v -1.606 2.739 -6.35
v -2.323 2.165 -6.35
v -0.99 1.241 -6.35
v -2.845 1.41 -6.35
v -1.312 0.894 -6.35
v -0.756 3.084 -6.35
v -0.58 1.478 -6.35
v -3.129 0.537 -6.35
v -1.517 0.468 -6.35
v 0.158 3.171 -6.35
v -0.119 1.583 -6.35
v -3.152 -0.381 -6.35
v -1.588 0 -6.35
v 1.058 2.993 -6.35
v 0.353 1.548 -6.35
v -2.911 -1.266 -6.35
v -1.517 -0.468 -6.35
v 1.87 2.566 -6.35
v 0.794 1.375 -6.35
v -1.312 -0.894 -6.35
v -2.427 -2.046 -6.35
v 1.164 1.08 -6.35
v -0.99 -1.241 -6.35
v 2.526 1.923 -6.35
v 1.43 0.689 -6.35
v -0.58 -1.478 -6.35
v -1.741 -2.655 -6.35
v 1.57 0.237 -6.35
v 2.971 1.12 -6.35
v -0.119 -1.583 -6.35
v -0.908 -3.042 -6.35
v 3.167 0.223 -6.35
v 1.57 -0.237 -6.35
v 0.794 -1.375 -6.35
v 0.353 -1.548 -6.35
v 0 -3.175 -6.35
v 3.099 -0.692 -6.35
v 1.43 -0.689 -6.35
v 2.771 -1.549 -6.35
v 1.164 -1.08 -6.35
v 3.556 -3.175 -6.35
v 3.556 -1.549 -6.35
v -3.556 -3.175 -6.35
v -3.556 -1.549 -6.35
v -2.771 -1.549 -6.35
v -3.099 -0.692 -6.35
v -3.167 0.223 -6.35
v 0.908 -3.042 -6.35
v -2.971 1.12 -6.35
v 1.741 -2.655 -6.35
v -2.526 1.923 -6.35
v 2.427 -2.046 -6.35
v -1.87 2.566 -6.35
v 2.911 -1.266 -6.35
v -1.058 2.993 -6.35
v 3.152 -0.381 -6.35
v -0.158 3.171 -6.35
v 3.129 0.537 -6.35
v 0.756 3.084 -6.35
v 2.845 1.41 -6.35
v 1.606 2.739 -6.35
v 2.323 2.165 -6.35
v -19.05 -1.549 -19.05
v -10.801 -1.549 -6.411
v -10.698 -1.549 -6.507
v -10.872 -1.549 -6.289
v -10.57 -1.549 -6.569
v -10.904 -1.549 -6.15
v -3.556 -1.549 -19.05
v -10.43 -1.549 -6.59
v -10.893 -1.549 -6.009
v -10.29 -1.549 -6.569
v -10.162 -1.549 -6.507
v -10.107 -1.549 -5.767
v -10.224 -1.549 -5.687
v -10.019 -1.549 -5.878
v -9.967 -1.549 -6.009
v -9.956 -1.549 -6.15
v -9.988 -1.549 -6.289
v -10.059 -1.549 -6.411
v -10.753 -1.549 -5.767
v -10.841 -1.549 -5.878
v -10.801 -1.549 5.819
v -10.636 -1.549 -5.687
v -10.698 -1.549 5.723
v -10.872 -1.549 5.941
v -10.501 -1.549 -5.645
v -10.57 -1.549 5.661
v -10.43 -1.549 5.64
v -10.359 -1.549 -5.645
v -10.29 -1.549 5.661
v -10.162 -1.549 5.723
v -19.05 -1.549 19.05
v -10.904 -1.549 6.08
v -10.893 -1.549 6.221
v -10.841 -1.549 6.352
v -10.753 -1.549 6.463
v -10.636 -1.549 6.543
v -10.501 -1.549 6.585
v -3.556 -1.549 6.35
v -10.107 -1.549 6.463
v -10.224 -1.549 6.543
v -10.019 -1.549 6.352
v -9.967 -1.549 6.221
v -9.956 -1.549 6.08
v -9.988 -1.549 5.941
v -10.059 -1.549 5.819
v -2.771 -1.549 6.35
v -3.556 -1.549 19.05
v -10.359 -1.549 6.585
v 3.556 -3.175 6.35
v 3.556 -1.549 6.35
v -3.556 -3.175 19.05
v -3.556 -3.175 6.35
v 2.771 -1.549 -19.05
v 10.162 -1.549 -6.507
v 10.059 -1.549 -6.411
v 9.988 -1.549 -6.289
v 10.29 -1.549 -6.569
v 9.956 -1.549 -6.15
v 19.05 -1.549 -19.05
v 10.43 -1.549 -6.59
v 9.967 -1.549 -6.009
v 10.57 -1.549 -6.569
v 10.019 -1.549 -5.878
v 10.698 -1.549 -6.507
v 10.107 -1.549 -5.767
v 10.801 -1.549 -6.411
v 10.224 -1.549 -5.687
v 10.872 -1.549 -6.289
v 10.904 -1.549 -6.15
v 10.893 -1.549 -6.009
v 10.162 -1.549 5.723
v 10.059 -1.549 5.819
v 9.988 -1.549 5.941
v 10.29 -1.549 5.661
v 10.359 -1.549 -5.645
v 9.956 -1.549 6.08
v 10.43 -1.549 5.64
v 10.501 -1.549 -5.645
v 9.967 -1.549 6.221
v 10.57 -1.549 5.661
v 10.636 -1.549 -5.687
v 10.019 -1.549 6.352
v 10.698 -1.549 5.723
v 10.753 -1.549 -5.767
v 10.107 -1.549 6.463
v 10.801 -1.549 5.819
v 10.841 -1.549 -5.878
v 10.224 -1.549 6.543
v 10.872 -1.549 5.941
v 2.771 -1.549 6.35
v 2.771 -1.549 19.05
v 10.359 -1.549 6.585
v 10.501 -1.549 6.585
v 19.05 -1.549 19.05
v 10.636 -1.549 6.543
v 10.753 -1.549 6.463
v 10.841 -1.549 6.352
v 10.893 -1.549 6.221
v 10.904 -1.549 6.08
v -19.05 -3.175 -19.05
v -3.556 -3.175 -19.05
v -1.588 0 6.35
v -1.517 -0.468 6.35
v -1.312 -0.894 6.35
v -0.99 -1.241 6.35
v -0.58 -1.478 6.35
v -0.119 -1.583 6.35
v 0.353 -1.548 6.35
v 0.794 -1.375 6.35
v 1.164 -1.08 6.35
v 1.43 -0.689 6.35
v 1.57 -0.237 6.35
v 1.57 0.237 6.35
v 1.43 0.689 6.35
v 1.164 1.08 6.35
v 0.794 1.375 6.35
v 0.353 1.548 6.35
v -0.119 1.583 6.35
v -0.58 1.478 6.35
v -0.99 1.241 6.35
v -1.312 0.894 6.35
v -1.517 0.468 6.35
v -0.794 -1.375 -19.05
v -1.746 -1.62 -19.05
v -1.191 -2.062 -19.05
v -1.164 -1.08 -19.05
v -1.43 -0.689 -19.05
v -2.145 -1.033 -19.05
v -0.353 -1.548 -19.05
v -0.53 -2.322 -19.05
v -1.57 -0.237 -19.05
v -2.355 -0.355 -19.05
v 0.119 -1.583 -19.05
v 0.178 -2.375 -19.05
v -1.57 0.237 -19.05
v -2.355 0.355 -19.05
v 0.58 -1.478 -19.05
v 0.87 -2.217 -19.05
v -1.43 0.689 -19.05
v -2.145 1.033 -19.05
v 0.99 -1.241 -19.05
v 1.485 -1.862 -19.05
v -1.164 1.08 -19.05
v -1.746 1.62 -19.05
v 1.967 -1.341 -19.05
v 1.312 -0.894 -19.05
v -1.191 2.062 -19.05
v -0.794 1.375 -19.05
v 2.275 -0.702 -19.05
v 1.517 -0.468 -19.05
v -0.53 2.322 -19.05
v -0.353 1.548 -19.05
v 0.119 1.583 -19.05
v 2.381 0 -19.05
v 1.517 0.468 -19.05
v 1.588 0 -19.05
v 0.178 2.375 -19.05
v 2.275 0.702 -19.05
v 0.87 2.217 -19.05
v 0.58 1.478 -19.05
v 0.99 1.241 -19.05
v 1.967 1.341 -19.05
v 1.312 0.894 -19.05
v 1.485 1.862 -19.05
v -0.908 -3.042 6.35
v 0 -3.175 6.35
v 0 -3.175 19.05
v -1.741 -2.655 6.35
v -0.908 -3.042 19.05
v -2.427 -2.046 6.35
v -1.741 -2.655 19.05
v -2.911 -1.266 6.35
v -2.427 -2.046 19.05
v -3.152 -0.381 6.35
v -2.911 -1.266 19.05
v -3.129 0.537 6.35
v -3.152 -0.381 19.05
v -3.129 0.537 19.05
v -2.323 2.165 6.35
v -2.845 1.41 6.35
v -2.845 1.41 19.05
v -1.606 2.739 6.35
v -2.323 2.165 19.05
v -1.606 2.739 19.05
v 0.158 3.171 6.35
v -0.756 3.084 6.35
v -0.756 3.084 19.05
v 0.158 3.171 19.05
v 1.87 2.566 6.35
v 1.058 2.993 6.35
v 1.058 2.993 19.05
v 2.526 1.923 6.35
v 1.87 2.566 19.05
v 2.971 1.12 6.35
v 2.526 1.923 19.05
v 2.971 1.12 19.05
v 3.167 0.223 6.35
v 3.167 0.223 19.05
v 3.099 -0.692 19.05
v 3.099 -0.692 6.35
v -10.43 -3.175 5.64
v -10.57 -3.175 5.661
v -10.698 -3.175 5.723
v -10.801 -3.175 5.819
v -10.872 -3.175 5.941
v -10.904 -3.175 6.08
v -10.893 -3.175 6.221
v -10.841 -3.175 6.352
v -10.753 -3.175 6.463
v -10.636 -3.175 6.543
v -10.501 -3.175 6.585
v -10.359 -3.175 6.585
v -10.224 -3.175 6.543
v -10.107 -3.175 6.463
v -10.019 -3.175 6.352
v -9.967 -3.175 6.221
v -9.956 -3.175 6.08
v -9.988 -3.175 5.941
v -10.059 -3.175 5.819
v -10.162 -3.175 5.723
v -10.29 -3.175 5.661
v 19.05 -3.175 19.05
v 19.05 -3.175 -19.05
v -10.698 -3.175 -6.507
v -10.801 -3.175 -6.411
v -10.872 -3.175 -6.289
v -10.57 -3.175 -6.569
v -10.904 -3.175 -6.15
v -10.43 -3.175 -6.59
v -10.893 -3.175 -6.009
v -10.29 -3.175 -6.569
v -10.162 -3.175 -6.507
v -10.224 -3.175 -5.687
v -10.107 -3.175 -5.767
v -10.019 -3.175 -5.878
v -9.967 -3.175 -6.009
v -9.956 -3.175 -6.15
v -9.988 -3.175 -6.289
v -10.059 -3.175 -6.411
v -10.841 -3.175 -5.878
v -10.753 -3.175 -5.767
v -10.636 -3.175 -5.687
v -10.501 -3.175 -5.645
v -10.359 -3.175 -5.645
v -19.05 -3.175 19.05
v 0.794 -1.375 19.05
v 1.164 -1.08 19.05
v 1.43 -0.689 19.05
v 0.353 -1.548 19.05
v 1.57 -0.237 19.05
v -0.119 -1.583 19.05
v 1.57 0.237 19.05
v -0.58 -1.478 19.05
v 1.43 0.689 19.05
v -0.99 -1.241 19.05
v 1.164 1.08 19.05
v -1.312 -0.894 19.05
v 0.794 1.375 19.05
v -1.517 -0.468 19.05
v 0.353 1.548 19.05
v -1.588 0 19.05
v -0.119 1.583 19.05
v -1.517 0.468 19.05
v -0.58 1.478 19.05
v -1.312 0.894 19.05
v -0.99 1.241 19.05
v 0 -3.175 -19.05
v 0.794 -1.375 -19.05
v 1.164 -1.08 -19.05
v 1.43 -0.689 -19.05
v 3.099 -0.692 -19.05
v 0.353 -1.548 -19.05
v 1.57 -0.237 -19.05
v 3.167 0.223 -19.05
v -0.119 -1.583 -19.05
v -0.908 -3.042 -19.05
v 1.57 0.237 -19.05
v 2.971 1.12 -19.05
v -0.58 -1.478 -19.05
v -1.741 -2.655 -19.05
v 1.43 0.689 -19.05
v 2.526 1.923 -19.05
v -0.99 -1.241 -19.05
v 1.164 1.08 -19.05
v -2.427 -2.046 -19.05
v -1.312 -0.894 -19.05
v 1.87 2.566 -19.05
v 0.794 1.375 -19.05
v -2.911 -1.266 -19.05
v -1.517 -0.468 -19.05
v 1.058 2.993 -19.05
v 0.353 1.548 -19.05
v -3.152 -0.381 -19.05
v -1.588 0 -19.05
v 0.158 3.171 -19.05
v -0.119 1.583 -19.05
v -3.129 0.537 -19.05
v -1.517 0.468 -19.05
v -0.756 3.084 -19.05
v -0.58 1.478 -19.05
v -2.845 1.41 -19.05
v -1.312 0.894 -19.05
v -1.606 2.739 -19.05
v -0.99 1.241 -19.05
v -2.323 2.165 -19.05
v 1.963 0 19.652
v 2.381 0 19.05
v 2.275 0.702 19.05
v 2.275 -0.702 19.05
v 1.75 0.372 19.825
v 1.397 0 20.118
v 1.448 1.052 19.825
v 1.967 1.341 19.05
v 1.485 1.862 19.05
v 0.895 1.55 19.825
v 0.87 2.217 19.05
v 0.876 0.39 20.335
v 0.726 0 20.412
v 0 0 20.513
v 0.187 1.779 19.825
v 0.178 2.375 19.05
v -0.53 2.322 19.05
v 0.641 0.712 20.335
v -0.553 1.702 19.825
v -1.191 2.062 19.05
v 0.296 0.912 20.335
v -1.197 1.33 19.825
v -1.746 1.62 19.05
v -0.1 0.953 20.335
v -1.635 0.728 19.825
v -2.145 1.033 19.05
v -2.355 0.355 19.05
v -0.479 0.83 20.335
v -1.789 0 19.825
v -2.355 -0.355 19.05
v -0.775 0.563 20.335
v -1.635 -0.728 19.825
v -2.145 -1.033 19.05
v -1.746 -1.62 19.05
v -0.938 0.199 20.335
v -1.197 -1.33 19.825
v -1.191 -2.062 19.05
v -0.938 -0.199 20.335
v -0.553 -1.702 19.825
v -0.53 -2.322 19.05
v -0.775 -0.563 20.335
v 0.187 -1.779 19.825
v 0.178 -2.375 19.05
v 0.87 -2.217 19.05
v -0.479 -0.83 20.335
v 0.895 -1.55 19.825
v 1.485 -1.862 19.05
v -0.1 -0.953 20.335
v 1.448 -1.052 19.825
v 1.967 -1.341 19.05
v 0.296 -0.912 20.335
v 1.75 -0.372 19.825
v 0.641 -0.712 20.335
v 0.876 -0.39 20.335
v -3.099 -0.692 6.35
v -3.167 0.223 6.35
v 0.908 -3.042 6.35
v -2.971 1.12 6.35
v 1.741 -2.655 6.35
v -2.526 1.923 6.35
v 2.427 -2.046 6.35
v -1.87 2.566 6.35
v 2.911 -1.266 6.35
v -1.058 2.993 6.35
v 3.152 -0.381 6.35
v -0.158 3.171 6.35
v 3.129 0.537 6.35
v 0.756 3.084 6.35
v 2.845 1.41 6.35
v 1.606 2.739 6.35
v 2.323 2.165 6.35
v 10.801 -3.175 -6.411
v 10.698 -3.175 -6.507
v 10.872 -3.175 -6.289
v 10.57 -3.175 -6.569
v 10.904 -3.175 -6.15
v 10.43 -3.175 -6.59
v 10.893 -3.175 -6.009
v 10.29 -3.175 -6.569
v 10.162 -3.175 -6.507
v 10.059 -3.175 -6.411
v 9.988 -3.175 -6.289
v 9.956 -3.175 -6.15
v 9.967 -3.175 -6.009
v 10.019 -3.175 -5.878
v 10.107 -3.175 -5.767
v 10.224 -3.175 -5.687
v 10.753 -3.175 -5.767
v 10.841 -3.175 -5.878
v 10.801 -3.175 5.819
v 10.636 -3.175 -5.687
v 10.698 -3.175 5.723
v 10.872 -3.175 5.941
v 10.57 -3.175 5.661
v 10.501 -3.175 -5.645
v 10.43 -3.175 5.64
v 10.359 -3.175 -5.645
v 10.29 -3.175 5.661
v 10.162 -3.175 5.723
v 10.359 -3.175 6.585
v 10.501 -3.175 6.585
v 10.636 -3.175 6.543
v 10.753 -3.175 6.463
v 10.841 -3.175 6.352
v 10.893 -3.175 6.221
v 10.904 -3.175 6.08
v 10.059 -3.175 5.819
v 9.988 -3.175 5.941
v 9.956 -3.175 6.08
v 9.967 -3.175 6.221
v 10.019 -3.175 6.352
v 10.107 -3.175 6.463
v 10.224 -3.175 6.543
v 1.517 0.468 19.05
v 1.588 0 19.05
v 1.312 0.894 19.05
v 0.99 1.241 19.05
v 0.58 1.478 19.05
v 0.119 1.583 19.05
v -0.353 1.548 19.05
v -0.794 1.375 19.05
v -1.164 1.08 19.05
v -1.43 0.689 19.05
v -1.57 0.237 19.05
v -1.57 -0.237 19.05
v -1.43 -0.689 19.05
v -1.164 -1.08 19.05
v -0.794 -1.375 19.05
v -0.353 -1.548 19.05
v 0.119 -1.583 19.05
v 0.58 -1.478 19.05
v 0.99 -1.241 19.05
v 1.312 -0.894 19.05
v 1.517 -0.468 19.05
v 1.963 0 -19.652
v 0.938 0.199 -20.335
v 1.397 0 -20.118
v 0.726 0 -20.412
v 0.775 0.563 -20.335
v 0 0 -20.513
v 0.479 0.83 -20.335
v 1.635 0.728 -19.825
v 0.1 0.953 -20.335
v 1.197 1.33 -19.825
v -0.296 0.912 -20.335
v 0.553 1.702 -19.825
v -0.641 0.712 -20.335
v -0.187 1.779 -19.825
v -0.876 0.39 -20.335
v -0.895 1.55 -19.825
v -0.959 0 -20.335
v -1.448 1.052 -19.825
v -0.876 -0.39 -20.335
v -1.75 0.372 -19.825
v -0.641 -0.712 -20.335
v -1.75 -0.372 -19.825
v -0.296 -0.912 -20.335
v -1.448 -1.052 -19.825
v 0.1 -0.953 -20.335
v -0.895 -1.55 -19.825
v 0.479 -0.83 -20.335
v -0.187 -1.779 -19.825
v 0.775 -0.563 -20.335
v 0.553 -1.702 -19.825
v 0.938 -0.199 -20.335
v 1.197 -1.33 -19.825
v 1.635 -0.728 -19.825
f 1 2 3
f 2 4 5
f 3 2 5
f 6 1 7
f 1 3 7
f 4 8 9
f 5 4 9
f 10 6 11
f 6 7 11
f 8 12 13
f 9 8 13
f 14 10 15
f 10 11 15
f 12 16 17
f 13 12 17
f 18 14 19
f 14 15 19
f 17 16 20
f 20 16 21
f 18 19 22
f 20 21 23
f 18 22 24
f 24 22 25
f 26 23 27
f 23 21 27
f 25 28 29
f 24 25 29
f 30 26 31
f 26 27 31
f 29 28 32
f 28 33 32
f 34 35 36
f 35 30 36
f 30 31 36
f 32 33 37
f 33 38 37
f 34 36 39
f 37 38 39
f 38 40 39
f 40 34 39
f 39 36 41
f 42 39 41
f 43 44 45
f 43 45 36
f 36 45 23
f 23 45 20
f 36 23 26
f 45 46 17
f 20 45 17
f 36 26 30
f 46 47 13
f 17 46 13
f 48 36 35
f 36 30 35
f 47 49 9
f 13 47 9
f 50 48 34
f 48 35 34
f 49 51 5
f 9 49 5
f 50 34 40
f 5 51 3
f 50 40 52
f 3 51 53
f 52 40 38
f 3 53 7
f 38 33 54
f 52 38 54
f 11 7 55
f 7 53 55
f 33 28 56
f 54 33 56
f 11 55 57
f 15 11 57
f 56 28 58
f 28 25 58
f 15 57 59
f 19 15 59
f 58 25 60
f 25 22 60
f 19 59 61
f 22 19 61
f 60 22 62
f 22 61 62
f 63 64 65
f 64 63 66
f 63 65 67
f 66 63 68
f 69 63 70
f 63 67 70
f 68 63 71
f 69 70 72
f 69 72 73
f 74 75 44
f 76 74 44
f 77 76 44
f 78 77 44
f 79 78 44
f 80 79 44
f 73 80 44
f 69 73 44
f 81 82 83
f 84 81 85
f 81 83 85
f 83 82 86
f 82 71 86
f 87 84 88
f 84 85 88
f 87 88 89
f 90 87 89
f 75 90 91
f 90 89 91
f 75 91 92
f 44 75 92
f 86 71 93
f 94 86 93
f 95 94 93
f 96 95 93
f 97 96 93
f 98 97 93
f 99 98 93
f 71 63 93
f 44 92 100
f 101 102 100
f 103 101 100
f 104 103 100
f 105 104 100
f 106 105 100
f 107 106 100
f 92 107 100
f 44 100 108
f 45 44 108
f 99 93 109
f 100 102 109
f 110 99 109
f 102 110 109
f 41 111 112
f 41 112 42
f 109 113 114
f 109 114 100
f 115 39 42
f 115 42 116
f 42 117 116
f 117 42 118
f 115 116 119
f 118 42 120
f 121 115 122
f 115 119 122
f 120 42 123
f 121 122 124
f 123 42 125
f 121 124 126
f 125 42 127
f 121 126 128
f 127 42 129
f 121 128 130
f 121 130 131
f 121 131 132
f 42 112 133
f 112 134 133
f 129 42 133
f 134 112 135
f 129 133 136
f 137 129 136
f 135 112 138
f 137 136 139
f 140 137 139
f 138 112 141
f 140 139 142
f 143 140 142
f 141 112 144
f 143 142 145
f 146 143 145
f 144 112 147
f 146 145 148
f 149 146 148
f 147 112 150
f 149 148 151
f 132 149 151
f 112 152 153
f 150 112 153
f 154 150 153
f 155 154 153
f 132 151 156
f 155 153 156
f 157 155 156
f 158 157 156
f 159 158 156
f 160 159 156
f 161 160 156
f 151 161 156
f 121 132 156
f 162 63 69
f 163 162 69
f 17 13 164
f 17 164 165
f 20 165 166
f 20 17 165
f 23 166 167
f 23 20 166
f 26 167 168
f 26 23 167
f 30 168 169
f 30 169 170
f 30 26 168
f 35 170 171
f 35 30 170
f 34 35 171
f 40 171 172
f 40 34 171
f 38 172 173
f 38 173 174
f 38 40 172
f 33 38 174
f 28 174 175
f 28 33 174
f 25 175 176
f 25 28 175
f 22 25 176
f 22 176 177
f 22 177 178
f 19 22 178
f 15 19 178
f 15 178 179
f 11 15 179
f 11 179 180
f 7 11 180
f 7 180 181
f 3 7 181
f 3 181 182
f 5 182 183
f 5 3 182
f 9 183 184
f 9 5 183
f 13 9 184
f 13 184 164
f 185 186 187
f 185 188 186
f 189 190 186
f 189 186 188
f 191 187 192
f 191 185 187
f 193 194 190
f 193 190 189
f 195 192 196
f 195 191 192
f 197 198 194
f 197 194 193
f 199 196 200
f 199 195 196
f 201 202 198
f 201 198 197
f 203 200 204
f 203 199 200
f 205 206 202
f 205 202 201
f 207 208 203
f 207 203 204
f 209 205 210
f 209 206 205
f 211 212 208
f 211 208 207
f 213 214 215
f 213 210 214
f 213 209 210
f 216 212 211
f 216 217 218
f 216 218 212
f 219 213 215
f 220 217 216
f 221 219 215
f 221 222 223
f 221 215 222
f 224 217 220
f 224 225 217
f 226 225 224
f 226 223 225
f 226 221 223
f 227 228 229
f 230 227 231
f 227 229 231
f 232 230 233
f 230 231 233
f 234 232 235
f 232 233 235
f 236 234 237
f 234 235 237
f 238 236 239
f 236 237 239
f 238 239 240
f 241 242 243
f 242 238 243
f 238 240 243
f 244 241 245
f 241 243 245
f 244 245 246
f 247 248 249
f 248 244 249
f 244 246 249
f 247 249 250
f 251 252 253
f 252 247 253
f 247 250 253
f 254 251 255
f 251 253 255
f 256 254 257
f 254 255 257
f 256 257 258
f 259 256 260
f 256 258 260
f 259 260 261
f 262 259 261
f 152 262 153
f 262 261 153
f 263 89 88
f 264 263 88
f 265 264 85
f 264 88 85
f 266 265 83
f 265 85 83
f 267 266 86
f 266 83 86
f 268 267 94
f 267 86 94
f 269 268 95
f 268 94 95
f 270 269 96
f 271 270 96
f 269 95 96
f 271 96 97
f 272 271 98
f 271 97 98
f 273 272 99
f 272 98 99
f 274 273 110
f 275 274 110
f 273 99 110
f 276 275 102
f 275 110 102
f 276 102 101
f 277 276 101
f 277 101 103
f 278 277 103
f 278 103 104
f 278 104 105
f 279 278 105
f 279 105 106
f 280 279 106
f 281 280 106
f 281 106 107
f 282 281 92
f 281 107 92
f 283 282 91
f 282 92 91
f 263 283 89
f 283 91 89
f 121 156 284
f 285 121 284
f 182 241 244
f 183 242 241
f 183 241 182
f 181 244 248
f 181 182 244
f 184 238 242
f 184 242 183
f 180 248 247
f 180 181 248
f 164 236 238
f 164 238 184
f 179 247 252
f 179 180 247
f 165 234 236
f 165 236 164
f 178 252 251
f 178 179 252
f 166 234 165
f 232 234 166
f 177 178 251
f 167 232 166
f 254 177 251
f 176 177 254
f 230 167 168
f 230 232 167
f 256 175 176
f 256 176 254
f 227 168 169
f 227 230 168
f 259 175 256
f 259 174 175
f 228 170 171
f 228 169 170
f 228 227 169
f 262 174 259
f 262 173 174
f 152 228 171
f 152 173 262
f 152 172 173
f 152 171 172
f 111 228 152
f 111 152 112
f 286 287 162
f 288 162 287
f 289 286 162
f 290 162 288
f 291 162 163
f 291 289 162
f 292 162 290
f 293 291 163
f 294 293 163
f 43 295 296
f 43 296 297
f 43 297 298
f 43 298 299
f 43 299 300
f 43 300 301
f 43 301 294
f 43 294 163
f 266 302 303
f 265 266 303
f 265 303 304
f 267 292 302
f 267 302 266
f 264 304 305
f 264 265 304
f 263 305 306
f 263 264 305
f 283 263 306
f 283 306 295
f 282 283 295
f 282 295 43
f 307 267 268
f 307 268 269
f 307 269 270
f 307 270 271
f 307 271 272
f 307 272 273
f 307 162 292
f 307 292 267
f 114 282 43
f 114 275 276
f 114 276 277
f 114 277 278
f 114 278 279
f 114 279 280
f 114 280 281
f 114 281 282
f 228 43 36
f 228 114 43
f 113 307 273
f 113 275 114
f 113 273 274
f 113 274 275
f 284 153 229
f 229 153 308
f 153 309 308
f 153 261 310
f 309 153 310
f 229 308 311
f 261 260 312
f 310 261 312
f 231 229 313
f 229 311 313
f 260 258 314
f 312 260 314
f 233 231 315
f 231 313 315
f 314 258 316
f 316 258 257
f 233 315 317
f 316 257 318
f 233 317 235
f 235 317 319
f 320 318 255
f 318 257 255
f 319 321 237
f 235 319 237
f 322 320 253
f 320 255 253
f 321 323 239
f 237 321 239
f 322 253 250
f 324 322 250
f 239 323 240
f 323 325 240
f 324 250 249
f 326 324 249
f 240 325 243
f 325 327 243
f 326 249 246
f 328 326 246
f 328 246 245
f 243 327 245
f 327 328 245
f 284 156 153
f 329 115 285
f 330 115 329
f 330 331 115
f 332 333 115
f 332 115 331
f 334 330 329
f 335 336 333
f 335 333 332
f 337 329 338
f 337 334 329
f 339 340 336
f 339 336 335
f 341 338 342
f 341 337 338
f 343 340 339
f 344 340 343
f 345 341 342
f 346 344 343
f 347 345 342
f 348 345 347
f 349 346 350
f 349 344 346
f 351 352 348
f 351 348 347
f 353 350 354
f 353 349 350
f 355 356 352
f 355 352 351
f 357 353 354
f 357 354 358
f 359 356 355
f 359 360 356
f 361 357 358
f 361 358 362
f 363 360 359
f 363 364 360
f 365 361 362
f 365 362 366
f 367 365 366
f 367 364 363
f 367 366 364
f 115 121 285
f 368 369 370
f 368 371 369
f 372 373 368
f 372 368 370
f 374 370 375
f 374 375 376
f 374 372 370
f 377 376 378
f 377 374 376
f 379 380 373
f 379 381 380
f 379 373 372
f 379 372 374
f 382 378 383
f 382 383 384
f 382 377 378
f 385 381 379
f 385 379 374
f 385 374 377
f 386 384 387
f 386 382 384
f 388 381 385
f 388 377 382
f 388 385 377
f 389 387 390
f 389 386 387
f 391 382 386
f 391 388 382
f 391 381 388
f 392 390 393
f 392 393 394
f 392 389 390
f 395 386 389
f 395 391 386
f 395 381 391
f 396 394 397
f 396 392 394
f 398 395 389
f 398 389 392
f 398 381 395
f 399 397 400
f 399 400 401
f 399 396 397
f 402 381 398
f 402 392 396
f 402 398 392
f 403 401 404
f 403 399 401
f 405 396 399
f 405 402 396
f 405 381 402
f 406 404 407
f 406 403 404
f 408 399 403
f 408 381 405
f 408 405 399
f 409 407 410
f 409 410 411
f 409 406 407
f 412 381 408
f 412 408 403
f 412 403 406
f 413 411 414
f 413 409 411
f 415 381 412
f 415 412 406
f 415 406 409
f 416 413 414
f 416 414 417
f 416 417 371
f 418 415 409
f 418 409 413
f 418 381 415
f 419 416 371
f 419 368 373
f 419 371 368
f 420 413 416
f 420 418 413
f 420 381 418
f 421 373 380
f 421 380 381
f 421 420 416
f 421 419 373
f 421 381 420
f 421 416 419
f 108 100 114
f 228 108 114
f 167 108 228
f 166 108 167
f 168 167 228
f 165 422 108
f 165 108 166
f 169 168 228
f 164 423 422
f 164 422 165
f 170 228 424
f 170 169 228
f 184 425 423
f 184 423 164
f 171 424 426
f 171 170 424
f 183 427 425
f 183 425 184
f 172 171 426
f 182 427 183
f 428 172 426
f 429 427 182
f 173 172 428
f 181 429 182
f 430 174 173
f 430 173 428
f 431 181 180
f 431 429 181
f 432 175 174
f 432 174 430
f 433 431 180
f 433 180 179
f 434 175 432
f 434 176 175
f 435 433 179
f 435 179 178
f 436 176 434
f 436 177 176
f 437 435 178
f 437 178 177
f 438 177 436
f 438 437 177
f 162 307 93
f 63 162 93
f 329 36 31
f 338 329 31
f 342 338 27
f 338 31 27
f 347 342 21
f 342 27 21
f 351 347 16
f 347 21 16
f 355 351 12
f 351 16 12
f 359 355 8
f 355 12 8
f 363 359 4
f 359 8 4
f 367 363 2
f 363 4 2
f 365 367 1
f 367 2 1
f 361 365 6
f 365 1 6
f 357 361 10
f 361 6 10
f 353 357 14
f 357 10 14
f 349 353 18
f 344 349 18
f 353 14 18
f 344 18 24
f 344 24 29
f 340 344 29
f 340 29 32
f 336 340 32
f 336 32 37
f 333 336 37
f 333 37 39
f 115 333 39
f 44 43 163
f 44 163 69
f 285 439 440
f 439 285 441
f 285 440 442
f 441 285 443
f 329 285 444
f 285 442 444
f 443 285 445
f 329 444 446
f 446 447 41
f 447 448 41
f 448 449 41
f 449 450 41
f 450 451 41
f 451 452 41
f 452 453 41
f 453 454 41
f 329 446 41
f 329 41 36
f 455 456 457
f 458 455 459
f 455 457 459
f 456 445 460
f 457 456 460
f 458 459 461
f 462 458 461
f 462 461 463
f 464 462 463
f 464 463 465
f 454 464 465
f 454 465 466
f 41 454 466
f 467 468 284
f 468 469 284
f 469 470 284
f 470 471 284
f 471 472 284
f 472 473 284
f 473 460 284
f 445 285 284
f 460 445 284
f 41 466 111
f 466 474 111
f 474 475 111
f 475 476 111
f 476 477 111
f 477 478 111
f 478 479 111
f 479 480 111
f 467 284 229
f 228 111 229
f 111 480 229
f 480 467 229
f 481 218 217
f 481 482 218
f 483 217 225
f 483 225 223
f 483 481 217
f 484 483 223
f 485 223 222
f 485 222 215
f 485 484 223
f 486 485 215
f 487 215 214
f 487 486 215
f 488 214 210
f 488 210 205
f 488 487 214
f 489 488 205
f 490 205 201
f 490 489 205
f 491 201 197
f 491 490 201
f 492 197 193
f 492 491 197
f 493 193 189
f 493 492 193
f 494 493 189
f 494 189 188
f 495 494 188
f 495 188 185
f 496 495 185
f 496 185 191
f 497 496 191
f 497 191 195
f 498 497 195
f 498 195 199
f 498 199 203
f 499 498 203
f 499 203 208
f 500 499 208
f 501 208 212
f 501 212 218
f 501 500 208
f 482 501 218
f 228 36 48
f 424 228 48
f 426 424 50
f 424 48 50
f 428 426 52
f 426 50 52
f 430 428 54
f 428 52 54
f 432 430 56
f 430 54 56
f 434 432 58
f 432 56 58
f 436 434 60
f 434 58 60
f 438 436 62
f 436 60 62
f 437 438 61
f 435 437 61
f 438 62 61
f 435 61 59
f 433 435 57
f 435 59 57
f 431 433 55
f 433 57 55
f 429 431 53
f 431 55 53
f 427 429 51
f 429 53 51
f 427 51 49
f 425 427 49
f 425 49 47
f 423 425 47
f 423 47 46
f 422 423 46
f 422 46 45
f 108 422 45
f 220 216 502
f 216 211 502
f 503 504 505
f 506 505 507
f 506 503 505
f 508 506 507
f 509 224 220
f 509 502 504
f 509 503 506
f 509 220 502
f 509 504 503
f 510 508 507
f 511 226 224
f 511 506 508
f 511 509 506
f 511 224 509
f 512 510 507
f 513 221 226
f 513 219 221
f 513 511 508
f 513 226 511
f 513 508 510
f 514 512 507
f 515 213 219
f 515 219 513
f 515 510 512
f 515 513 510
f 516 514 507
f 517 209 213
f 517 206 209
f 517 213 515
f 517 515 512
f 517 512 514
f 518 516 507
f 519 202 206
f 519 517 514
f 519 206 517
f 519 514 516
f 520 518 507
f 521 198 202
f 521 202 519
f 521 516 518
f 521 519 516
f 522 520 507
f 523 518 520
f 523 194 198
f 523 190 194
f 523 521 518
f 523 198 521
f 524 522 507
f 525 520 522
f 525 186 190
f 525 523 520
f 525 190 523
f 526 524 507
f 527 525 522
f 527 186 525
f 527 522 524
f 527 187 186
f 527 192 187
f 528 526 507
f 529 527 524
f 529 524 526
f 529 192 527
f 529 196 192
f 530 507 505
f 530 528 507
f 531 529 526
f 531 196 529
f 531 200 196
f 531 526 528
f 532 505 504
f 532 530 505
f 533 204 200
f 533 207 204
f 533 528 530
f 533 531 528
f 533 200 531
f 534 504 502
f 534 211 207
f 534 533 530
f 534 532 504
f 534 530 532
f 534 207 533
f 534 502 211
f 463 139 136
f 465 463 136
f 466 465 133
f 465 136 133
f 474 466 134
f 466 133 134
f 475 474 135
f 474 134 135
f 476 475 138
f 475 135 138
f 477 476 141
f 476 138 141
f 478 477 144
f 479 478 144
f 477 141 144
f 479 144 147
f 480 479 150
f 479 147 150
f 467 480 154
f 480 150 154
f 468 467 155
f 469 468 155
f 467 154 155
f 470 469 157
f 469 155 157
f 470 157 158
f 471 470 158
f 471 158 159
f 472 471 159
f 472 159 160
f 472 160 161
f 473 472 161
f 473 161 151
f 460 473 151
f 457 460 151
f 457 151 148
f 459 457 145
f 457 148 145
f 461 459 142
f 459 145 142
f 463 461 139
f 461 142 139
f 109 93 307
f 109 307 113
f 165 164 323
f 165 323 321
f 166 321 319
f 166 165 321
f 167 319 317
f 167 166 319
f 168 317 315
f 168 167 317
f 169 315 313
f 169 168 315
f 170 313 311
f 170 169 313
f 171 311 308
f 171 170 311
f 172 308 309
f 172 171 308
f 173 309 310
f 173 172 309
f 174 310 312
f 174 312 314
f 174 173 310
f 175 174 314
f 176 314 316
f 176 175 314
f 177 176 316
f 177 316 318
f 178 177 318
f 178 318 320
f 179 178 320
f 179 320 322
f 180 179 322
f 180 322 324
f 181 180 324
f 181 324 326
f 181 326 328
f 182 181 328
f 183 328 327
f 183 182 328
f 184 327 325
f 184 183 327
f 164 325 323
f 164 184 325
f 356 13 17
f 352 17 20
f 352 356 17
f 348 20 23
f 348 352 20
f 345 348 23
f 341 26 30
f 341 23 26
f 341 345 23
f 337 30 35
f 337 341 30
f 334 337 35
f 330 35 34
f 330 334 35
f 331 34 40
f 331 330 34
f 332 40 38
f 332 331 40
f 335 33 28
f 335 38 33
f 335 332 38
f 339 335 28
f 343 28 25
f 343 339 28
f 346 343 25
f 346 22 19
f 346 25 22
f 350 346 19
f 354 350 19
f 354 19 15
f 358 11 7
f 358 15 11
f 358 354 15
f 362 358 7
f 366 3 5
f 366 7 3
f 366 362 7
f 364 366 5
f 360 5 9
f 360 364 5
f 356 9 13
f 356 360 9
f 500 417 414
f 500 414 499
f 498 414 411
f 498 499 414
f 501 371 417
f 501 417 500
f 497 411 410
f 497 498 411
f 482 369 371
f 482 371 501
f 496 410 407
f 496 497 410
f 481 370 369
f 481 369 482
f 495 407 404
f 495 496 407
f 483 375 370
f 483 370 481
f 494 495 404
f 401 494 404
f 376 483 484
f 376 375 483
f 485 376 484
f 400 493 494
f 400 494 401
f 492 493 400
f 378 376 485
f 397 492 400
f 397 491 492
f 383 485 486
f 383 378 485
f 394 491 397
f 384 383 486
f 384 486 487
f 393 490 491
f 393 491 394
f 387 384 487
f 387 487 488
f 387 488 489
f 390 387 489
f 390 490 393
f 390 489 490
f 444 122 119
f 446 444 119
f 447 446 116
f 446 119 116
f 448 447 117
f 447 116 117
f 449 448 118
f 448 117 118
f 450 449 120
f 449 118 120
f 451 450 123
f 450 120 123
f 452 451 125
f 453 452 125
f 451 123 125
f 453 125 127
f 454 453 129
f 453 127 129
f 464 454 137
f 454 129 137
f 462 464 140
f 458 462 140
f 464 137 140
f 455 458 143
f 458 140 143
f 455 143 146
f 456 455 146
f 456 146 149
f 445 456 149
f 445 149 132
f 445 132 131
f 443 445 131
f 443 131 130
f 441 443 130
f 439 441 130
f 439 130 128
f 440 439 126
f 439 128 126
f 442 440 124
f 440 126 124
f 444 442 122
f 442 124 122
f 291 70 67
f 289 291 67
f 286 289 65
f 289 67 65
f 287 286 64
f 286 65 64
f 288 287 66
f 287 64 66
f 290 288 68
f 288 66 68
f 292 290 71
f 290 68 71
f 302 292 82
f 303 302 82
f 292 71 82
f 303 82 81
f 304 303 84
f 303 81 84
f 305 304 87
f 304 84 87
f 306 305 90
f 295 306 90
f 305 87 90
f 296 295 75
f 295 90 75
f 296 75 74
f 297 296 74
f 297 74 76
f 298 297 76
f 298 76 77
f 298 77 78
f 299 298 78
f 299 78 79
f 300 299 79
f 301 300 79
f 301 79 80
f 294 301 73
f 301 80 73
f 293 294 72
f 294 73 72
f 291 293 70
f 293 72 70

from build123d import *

# Parameters (mm, degrees)
SKETCH1_R                         = 1.5875
EXTRUDE1_DEPTH                    = 19.05
SKETCH1_W                         = 15.494
SKETCH1_H                         = 1.6256
EXTRUDE1_2_DEPTH                  = 19.05
EXTRUDE4_DEPTH                    = 29.173887468
EXTRUDE4_DEPTH_BACK               = 29.173887468
SKETCH8_W                         = 7.112
SKETCH8_H                         = 12.7
SKETCH9_R                         = 1.5875
EXTRUDE5_DEPTH                    = 12.7
SKETCH22_W                        = 0.475
SKETCH22_H                        = 1.6266
M1_2X0_25_TAPPED_HOLE1_AT_2_COUNT = 2
M1_2X0_25_TAPPED_HOLE1_AT_2_PITCH = 12.23
SKETCH23_W                        = 0.475
SKETCH23_H                        = 1.62665
M1_2X0_25_TAPPED_HOLE2_AT_2_COUNT = 2
M1_2X0_25_TAPPED_HOLE2_AT_2_PITCH = 12.23


with BuildPart() as part:
    # Sketch1 → Extrude1 (new, symmetric)
    with BuildSketch(Plane.XY):
        with BuildLine():
            Line((19.05, -3.175), (0, -3.175))
            ThreePointArc((0, -3.175), (-1.606437051, 2.738610049), (2.771278521, -1.5494))
            Line((2.771278521, -1.5494), (19.05, -1.5494))
            Line((19.05, -1.5494), (19.05, -3.175))
        make_face()
        with Locations(Location((0, 0, 0), (0, 0, 180))):
            Circle(SKETCH1_R, mode=Mode.SUBTRACT)
    extrude(amount=EXTRUDE1_DEPTH, both=True)

    # Sketch8 → Extrude4 (cut, two sides: drawn at the far end of the back side and taken through both)
    with BuildSketch(Plane(origin=(0, 0, 0), x_dir=(1, 0, 0), z_dir=(0, 1, 0)).offset(-EXTRUDE4_DEPTH_BACK)):
        Rectangle(SKETCH8_W, SKETCH8_H)
    extrude(amount=EXTRUDE4_DEPTH + EXTRUDE4_DEPTH_BACK, mode=Mode.SUBTRACT)

    # Sketch22 → M1.2x0.25 Tapped Hole1 (revolve, cut)
    with BuildSketch(Plane(origin=(10.43, -3.175, -6.115), x_dir=(0, 0, -1), z_dir=(1, 0, 0))):
        with Locations((0.2375, 0.8133)):
            Rectangle(SKETCH22_W, SKETCH22_H)
    m1_2x0_25_tapped_hole1 = revolve(axis=Axis((10.43, -9.525, -6.115), (0, 1, 0)), mode=Mode.SUBTRACT)

    # M1.2x0.25 Tapped Hole1 at 2: M1.2x0.25 Tapped Hole1 ×2
    with Locations(*[(0, 0, i * M1_2X0_25_TAPPED_HOLE1_AT_2_PITCH) for i in range(1, M1_2X0_25_TAPPED_HOLE1_AT_2_COUNT)]):
        add(m1_2x0_25_tapped_hole1, mode=Mode.SUBTRACT)


with BuildPart() as body_2:
    # Sketch1 → Extrude1 2 (new, symmetric)
    with BuildSketch(Plane.XY):
        with Locations((-11.303, -2.3622)):
            Rectangle(SKETCH1_W, SKETCH1_H)
    extrude(amount=EXTRUDE1_2_DEPTH, both=True)

    # Sketch9 → Extrude5 (add)
    with BuildSketch(Plane.XY.offset(-6.35)):
        with BuildLine():
            Line((-2.771278521, -1.5494), (-3.556, -1.5494))
            Line((-3.556, -1.5494), (-3.556, -3.175))
            Line((-3.556, -3.175), (0, -3.175))
            ThreePointArc((0, -3.175), (1.606437051, 2.738610049), (-2.771278521, -1.5494))
        make_face()
        with Locations(Location((0, 0, 0), (0, 0, 180))):
            Circle(SKETCH9_R, mode=Mode.SUBTRACT)
    extrude(amount=EXTRUDE5_DEPTH)

    # Sketch23 → M1.2x0.25 Tapped Hole2 (revolve, cut)
    with BuildSketch(Plane(origin=(-10.43, -3.175, -6.115), x_dir=(0, 0, -1), z_dir=(1, 0, 0))):
        with Locations((0.2375, 0.813325)):
            Rectangle(SKETCH23_W, SKETCH23_H)
    m1_2x0_25_tapped_hole2 = revolve(axis=Axis((-10.43, -9.525, -6.115), (0, 1, 0)), mode=Mode.SUBTRACT)

    # M1.2x0.25 Tapped Hole2 at 2: M1.2x0.25 Tapped Hole2 ×2
    with Locations(*[(0, 0, i * M1_2X0_25_TAPPED_HOLE2_AT_2_PITCH) for i in range(1, M1_2X0_25_TAPPED_HOLE2_AT_2_COUNT)]):
        add(m1_2x0_25_tapped_hole2, mode=Mode.SUBTRACT)


with BuildPart() as body_3:
    # Sketch6 → Revolve1 (revolve)
    with BuildSketch(Plane(origin=(0, 0, 0), x_dir=(1, 0, 0), z_dir=(0, 1, 0)), mode=Mode.PRIVATE) as revolve1_sk:
        with BuildLine():
            Line((-2.38125, 19.05), (-1.5875, 19.05))
            Line((-1.5875, 19.05), (-1.5875, -19.05))
            Line((-1.5875, -19.05), (-2.38125, -19.05))
            ThreePointArc((-2.38125, -19.05), (-1.397393789, -20.118057742), (0, -20.51304))
            Line((0, -20.51304), (0, 20.51304))
            ThreePointArc((0, 20.51304), (-1.397393789, 20.118057742), (-2.38125, 19.05))
        make_face()
    revolve(revolve1_sk.sketch.rotate(Axis((0, 0, -20.51304), (0, 0, 1)), 180), axis=Axis((0, 0, -20.51304), (0, 0, 1)))


solid = Compound([part.part, body_2.part, body_3.part])
